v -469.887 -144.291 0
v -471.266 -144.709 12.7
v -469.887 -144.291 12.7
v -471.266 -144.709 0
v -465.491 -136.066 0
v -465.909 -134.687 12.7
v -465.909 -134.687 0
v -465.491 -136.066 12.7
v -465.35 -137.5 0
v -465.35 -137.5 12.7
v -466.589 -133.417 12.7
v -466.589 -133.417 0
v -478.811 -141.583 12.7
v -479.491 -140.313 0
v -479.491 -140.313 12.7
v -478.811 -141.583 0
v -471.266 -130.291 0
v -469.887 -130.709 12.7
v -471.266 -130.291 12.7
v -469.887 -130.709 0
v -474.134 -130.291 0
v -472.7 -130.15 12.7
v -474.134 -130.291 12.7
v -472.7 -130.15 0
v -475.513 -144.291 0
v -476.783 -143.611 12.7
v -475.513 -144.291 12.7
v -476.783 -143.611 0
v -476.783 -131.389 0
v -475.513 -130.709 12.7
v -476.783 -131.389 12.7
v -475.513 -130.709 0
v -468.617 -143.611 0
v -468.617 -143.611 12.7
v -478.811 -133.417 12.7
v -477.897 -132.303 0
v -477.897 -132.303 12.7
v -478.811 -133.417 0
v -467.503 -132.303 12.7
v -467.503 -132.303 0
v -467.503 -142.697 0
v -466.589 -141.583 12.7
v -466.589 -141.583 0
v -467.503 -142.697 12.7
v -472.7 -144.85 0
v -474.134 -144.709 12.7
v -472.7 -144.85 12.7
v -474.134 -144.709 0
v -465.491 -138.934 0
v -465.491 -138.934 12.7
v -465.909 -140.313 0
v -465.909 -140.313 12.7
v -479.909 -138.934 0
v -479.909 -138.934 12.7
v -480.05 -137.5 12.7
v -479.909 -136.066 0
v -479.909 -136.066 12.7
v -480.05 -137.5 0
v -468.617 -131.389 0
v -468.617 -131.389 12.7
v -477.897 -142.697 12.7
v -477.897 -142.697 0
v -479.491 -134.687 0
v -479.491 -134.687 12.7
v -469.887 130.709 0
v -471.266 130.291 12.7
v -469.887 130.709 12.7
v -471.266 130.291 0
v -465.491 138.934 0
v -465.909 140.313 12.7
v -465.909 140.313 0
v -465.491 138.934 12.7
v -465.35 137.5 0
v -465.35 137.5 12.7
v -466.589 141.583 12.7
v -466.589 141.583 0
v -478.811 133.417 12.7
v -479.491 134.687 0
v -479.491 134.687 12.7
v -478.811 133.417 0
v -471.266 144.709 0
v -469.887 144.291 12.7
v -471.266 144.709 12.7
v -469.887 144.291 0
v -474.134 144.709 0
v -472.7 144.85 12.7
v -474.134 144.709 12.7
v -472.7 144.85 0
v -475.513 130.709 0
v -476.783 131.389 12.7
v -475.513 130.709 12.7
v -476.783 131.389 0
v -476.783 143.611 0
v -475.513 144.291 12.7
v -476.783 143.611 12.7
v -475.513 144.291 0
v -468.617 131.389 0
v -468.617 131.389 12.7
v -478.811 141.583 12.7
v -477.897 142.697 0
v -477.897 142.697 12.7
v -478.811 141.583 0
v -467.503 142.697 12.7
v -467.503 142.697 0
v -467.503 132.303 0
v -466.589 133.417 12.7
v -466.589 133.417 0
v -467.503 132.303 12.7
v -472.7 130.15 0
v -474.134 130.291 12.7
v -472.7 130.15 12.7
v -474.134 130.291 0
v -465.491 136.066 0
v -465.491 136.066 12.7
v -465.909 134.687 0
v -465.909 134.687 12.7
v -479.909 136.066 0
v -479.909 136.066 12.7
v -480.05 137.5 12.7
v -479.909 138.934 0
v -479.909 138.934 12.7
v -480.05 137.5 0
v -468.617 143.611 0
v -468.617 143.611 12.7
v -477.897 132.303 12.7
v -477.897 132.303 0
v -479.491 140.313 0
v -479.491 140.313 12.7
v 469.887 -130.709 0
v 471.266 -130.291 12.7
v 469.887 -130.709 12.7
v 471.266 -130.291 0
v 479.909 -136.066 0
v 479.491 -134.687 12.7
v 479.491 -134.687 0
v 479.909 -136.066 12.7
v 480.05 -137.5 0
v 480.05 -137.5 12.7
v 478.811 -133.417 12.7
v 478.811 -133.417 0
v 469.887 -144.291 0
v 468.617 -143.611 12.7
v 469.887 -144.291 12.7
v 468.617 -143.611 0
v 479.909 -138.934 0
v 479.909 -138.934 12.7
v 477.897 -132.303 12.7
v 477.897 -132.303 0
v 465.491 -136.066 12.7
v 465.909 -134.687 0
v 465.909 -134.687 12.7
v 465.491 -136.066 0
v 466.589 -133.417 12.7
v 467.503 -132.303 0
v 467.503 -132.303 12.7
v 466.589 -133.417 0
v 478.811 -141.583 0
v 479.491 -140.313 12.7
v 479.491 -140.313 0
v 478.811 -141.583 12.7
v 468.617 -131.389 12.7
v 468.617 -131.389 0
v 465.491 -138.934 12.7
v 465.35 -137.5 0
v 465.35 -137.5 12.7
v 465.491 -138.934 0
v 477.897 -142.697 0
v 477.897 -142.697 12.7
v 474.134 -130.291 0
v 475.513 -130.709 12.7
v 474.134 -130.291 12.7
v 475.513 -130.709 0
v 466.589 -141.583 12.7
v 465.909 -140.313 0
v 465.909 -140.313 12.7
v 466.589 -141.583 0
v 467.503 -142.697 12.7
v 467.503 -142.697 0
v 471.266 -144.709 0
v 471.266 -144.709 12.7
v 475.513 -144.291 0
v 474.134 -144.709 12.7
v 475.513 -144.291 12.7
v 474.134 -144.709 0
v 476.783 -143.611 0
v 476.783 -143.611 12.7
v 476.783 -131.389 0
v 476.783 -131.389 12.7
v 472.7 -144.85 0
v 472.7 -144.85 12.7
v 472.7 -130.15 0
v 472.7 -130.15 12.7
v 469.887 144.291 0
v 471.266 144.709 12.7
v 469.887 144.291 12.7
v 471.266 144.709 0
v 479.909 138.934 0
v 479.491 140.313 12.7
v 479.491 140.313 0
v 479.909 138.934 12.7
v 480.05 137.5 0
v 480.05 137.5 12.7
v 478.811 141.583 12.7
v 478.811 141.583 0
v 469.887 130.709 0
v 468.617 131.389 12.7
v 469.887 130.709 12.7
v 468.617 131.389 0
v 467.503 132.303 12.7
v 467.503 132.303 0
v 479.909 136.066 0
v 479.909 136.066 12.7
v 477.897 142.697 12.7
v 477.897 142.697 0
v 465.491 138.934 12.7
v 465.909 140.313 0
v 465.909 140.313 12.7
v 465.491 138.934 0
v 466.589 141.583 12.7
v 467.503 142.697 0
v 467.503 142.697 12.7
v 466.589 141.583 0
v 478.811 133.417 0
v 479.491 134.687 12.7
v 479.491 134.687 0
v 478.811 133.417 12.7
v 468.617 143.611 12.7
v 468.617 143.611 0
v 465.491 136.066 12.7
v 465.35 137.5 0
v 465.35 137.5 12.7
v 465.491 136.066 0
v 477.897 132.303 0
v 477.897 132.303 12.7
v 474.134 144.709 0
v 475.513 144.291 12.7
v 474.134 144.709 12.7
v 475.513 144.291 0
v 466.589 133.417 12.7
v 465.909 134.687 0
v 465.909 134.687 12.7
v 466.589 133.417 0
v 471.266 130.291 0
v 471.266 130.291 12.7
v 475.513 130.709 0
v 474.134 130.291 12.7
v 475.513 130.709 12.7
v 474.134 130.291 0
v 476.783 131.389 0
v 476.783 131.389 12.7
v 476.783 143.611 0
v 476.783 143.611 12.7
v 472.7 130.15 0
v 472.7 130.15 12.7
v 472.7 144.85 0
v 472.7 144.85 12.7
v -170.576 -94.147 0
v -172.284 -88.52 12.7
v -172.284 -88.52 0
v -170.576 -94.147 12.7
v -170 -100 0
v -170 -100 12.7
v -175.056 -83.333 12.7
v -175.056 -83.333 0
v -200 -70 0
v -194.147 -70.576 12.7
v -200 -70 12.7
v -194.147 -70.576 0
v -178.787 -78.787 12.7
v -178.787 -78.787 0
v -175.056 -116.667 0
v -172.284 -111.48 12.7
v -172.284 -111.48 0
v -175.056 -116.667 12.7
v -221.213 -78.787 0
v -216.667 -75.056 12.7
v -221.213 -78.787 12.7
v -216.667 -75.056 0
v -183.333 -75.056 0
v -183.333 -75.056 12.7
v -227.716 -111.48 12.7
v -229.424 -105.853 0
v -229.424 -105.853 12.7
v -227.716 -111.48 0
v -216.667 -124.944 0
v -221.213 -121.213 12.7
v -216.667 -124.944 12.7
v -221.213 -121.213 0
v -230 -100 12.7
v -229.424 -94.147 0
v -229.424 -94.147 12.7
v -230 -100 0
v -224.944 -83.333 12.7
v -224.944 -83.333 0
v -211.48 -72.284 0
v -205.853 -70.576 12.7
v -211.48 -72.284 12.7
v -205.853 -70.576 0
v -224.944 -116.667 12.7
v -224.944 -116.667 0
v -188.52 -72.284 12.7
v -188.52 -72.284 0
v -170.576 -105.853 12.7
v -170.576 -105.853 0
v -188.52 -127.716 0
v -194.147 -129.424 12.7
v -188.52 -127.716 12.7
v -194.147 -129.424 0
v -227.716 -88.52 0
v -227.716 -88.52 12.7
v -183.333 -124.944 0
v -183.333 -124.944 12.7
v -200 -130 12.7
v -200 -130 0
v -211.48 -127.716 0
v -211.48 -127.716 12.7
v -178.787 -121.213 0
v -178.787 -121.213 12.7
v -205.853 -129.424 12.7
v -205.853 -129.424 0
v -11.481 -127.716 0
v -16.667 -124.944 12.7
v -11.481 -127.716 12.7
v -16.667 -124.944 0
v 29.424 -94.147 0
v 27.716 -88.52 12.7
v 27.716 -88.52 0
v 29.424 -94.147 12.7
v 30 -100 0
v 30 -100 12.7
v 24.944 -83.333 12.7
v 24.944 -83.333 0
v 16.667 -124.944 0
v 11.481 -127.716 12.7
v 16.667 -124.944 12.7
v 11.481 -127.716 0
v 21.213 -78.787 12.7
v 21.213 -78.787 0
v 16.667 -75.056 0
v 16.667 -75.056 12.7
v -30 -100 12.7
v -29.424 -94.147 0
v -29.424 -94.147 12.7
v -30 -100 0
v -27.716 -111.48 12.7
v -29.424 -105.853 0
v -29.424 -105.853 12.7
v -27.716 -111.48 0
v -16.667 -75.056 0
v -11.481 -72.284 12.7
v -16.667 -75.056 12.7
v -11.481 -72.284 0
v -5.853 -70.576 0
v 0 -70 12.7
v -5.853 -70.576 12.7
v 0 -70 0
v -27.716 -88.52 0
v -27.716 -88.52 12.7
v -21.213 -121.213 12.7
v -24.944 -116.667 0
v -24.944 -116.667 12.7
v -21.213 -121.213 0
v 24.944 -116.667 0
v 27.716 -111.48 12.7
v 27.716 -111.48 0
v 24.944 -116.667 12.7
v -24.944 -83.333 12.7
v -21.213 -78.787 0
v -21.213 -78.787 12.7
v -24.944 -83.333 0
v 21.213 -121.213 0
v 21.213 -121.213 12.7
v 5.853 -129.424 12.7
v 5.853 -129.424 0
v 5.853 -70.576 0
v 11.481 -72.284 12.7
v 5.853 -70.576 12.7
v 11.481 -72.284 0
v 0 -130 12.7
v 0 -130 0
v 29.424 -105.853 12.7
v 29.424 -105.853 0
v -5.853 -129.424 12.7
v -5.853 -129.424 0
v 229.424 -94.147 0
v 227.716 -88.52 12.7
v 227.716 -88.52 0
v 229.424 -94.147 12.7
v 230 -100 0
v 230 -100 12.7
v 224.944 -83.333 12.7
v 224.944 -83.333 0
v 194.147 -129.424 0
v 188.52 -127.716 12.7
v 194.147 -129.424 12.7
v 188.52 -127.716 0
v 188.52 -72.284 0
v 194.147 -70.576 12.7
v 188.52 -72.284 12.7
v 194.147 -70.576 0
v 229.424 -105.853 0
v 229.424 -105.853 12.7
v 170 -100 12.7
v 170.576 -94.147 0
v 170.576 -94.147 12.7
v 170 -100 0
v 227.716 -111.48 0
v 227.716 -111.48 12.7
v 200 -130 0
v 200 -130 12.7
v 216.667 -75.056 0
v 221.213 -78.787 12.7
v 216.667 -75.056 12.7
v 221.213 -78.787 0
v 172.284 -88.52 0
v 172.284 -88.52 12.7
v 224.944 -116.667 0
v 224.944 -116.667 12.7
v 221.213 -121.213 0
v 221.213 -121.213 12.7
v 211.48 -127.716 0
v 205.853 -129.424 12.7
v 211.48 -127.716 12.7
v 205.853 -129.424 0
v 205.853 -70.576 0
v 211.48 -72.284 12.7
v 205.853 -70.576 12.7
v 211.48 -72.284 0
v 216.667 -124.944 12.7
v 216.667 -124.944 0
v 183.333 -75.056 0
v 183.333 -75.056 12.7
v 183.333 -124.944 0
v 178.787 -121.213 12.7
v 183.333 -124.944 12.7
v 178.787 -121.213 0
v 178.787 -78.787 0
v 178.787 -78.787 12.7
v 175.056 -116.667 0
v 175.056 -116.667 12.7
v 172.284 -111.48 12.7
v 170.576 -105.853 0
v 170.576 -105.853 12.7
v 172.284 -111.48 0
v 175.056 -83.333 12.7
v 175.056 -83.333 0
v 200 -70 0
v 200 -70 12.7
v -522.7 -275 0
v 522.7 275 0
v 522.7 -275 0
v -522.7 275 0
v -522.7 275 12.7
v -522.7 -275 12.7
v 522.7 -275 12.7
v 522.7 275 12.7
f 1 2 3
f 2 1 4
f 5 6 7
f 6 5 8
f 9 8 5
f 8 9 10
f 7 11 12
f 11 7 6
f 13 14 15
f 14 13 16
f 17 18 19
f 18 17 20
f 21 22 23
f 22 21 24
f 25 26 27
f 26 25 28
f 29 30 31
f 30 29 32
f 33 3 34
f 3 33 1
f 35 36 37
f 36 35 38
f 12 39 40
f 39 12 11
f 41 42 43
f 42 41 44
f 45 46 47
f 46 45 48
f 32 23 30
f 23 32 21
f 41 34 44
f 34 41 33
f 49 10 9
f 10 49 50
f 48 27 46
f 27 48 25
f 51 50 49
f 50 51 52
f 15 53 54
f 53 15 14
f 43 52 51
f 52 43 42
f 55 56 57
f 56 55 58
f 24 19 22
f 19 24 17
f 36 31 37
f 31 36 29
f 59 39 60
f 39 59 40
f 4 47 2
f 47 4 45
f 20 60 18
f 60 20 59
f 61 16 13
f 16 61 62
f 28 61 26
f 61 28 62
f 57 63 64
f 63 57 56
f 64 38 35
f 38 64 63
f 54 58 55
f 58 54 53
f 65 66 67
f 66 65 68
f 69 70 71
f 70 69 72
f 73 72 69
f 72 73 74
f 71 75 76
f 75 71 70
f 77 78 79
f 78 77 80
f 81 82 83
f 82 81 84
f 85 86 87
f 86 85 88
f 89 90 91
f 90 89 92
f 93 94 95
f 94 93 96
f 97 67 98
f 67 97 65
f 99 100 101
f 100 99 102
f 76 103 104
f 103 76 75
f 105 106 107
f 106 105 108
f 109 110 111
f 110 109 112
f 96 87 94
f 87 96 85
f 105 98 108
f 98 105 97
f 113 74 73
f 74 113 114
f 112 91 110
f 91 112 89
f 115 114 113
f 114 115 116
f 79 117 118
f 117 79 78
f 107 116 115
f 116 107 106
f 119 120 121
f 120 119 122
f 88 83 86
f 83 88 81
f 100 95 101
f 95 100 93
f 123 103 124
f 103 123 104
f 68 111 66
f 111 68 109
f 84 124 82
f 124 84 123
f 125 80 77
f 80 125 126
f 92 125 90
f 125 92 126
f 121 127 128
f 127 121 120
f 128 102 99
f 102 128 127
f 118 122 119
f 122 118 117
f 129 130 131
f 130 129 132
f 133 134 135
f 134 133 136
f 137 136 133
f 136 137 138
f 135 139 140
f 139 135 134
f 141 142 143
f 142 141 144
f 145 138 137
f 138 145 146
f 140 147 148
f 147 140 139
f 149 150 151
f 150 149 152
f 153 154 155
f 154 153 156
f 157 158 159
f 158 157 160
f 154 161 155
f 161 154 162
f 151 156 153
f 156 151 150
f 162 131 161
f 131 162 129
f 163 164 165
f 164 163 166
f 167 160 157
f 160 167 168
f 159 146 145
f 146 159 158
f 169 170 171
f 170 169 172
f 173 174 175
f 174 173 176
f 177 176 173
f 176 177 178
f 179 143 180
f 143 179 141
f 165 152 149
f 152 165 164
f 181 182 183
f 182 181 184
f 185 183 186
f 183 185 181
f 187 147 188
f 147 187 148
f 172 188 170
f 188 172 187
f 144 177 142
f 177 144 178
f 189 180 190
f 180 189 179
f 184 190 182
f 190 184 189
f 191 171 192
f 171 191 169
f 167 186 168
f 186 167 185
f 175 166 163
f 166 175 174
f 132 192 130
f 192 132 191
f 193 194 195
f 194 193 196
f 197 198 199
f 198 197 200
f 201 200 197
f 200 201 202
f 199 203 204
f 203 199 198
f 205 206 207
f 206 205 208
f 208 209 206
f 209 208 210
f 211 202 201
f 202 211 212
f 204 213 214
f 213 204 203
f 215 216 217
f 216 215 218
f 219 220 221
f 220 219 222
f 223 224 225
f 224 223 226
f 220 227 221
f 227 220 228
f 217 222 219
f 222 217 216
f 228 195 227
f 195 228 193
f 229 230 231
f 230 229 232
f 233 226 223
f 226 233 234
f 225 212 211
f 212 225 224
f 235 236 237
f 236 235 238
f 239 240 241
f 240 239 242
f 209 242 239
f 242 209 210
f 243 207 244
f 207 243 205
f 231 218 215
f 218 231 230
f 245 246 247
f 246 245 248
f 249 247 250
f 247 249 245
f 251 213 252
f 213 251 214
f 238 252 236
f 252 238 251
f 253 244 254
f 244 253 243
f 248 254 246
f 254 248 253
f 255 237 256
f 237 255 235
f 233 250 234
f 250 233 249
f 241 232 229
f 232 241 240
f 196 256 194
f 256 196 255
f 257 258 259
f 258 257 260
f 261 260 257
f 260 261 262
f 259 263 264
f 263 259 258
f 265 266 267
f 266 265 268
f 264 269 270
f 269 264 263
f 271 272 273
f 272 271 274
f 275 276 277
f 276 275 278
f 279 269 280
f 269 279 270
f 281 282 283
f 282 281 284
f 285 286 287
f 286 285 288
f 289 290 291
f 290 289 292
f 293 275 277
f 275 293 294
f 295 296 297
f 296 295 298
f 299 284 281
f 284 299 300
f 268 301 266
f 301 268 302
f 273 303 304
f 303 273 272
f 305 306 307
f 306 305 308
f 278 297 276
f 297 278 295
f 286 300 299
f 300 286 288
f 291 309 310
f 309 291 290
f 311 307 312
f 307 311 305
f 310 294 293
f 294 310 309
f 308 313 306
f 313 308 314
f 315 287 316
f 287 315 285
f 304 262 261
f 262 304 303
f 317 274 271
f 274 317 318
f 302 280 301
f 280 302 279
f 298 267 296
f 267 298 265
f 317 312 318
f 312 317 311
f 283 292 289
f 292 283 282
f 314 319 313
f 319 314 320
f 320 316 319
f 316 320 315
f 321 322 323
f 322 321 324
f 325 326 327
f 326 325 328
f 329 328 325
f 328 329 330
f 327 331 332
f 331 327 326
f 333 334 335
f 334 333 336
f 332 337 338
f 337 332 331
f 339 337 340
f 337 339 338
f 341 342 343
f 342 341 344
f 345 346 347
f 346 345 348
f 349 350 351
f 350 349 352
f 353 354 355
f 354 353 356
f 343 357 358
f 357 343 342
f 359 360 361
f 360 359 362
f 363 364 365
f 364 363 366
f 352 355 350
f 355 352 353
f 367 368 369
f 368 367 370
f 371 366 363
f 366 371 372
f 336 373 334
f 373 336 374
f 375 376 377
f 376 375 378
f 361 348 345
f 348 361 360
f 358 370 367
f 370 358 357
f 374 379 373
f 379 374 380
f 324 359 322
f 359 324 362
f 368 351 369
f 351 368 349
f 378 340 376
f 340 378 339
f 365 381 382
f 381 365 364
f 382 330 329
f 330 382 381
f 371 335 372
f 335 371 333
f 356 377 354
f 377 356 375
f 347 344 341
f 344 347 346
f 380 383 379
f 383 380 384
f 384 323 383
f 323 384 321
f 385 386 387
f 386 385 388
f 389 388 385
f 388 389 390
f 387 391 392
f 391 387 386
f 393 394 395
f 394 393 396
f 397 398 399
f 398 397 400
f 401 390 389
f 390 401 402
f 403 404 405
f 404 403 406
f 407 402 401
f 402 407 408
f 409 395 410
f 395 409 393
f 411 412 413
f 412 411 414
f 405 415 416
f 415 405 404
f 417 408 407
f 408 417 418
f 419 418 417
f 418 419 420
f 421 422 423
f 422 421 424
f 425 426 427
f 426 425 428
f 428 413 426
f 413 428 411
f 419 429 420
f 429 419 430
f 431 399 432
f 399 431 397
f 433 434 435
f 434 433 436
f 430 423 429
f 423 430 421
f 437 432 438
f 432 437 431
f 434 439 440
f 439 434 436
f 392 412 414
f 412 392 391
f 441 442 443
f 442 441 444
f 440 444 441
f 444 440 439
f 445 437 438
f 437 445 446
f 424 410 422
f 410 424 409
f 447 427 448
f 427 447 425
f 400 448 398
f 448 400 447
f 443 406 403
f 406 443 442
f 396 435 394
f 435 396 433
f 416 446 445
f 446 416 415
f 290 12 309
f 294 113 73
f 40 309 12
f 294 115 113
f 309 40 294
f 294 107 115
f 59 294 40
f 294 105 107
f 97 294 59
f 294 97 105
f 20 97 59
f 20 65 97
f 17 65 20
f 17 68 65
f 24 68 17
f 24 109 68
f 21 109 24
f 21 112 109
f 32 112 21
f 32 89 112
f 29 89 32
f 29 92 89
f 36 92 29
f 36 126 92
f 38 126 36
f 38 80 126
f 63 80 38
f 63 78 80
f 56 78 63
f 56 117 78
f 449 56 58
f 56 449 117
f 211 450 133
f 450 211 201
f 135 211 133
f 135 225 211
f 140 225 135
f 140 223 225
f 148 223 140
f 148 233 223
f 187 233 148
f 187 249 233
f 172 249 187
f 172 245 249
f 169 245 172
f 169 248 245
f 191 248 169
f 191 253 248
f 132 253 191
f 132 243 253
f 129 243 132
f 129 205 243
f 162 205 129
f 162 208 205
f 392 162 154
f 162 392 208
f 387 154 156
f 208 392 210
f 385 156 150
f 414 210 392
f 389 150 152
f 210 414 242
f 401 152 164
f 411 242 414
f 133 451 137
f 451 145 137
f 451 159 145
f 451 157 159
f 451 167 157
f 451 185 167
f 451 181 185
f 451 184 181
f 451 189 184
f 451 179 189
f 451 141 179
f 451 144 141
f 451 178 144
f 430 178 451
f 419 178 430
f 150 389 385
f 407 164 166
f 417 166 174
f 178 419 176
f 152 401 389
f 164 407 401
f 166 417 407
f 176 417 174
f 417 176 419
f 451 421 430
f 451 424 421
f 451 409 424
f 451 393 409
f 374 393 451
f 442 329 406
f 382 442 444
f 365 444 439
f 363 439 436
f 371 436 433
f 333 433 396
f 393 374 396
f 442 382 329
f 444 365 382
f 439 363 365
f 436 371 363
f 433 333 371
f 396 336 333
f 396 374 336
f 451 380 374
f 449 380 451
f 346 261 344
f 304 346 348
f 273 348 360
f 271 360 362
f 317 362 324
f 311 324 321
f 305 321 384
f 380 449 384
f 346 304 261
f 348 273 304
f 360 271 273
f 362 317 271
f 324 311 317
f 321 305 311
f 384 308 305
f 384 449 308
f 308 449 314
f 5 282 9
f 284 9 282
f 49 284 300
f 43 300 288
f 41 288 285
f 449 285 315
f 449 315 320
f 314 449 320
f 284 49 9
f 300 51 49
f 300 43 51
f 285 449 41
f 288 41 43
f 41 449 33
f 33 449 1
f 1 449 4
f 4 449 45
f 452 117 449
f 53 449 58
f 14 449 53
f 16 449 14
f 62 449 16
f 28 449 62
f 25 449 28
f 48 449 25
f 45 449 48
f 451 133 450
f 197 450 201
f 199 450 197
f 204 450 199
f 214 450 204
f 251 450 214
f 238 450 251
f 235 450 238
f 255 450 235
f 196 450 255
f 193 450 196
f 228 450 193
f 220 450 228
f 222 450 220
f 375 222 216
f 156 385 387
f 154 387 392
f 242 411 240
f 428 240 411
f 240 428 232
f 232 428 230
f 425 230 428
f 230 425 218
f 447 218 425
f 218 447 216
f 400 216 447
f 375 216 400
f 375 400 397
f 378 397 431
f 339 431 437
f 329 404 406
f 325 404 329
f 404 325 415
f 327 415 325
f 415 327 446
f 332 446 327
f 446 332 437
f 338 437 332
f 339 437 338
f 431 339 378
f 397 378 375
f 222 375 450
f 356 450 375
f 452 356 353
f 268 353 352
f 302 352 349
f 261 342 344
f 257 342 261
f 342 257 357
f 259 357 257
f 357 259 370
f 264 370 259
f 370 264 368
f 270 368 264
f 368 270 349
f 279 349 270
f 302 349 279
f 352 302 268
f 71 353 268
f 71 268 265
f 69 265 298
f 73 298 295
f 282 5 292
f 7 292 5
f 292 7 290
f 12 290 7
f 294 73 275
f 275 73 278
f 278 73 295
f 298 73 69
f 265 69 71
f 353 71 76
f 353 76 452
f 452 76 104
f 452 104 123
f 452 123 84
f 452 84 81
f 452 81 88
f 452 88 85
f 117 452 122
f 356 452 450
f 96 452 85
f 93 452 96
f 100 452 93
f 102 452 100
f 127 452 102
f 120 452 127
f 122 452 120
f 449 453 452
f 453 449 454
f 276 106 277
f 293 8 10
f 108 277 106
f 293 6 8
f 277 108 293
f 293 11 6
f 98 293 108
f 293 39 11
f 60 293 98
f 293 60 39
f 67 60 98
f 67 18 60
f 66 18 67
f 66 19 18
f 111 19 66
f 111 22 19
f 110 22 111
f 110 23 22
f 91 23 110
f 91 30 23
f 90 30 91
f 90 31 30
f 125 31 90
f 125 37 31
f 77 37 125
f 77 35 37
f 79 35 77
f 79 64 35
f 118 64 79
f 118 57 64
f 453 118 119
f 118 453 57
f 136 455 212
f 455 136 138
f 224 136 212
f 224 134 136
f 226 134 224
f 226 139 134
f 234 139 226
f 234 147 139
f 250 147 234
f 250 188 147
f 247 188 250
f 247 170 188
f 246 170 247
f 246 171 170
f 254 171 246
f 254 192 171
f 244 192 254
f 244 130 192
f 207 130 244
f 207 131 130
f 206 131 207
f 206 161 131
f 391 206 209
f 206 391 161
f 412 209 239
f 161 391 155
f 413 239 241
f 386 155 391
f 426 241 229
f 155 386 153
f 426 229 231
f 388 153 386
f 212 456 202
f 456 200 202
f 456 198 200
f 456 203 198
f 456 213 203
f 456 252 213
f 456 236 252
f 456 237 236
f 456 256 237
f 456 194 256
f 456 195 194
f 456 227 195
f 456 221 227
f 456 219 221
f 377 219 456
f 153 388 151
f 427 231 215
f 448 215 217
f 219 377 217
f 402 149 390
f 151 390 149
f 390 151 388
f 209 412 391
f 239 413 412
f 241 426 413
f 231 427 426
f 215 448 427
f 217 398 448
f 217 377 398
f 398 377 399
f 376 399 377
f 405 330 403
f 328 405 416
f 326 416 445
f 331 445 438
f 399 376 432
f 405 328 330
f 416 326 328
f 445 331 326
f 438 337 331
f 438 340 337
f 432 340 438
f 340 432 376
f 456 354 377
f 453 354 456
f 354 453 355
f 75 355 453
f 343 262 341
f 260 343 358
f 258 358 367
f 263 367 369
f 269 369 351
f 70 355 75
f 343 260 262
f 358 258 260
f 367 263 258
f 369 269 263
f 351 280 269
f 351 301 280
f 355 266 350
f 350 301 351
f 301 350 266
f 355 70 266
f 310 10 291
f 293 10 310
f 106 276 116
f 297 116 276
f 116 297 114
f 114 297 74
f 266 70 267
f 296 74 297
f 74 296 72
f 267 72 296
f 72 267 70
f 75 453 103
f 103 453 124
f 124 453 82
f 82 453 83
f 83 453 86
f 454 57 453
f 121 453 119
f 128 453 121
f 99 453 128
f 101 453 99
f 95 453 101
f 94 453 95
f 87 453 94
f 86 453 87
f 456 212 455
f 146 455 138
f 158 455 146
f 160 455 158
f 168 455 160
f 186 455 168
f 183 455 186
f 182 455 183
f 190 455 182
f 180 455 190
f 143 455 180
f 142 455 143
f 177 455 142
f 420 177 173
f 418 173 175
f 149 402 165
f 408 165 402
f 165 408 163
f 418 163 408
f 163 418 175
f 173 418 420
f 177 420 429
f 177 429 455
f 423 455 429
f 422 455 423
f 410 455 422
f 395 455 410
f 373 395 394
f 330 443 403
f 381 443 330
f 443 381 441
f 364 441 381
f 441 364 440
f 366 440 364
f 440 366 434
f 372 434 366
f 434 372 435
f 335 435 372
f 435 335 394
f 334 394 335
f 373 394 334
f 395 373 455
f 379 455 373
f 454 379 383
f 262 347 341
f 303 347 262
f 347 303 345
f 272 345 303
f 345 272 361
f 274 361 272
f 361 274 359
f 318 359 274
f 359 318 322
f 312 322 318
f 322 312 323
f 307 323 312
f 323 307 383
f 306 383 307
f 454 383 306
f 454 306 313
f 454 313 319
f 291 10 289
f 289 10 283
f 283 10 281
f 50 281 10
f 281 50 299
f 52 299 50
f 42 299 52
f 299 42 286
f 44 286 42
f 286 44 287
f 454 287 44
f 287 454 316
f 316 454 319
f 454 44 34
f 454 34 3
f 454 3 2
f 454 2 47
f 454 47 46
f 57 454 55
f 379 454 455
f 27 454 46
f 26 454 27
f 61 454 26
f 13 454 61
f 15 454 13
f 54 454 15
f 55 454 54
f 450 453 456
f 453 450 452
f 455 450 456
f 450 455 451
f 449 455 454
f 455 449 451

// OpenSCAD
// file: ../openscad/lifetrac_v25_params.scad
// lifetrac_v25_params.scad
// Essential parameters for LifeTrac v25 individual parts
// This file contains only the constants needed for part design
// Full assembly uses lifetrac_v25.scad

// -----------------------------------------------------------------------------
// Compatibility helper
// OpenSCAD throws warnings when the BOSL2 helper `parent_modules()` is missing.
// We provide a stub that returns an empty list so part files can run cleanly
// when opened directly without pulling in BOSL2.
function parent_modules() = is_undef($parent_modules) ? [] : $parent_modules;

// =============================================================================
// MATERIAL CONSTANTS
// =============================================================================

PLATE_1_4_INCH = 6.35;   // 1/4" = 6.35mm
PLATE_1_2_INCH = 12.7;   // 1/2" = 12.7mm
PLATE_3_4_INCH = 19.05;  // 3/4" = 19.05mm
TUBE_3X3_1_4 = [76.2, 6.35];    // 3"x3" x 1/4" wall
TUBE_4X4_1_4 = [101.6, 6.35];   // 4"x4" x 1/4" wall (OSE standard)
TUBE_2X2_1_4 = [50.8, 6.35];    // 2"x2" x 1/4" wall
TUBE_2X4_1_4 = [50.8, 101.6, 6.35]; // 2"x4" rectangular

// Bolt/pin diameters
PIVOT_PIN_DIA = 38.1;    // 1.5" pivot pin
BOLT_DIA_1_2 = 12.7;     // 1/2" bolt
BOLT_DIA_3_4 = 19.05;    // 3/4" bolt
BOLT_DIA_1 = 25.4;       // 1" bolt

// =============================================================================
// MACHINE DIMENSIONS
// =============================================================================

// Target size: between Toro Dingo (915mm wide) and Bobcat (1830mm wide)
MACHINE_WIDTH = 1200;    // Overall width
MACHINE_LENGTH = 1800;   // Overall length
MACHINE_HEIGHT = 1000;   // Height to top of frame
WHEEL_BASE = 1400;       // Distance between front and rear axles
TRACK_WIDTH = 900;       // Distance between centerlines of left/right side panels

// Side panel sandwich configuration
SANDWICH_SPACING = 120;  // Gap between inner and outer panels (for arm pivot)
PANEL_THICKNESS = PLATE_1_2_INCH;

// Wheel dimensions
WHEEL_DIAMETER = 500;    // 500mm diameter wheels
WHEEL_WIDTH = 200;       // 200mm wide wheels
WHEEL_CLEARANCE = 50;    // Clearance between wheel and outer panel

// Ground clearance - bottom of frame above ground
GROUND_CLEARANCE = 150;  // 150mm ground clearance under frame
WHEEL_RADIUS = WHEEL_DIAMETER / 2;

// Frame sits with bottom at GROUND_CLEARANCE height
FRAME_Z_OFFSET = GROUND_CLEARANCE;

// Calculate wheel X offset - wheels positioned outside the outer panels
WHEEL_X_OFFSET = TRACK_WIDTH/2 + SANDWICH_SPACING/2 + PANEL_THICKNESS + WHEEL_WIDTH/2 + WHEEL_CLEARANCE;

// =============================================================================
// LOADER ARM DIMENSIONS
// =============================================================================

// Design constraints
BUCKET_GROUND_CLEARANCE = 0;      // Bucket bottom at ground level when lowered
BUCKET_FRONT_CLEARANCE = 100;     // 100mm (~4") clearance between bucket back and front of machine

// Arm pivot point (at top rear of side panels - tall end)
ARM_PIVOT_Y = 200;  // Near rear of machine, between sandwich plates  
ARM_PIVOT_Z_HEIGHT = MACHINE_HEIGHT - 50;  // Height above frame bottom
ARM_PIVOT_Z = FRAME_Z_OFFSET + ARM_PIVOT_Z_HEIGHT;  // Absolute Z position

// Calculate required arm length
MIN_HORIZONTAL_REACH = WHEEL_BASE + BUCKET_FRONT_CLEARANCE - ARM_PIVOT_Y;
ARM_LENGTH = ceil(sqrt(pow(ARM_PIVOT_Z, 2) + pow(MIN_HORIZONTAL_REACH, 2)));
ARM_GROUND_ANGLE = asin(ARM_PIVOT_Z / ARM_LENGTH);  // Angle below horizontal (degrees)

ARM_TUBE_SIZE = TUBE_3X3_1_4;         // 3"x3" arm tubing
ARM_SPACING = TRACK_WIDTH;            // Distance between arm centerlines

// Arm angle limits
ARM_MIN_ANGLE = -ARM_GROUND_ANGLE;     // Lowest position (at ground)
ARM_MAX_ANGLE = 60;                     // Maximum raised position

// Cross beam configuration
CROSS_BEAM_SIZE = TUBE_2X2_1_4[0];    // 2"x2" tube size
CROSS_BEAM_CLEARANCE = 15;             // Extra clearance around cross beam in cutout
CROSS_BEAM_1_POS = ARM_LENGTH * 0.65;   // First cross beam position
CROSS_BEAM_2_POS = ARM_LENGTH * 0.95;   // Second cross beam position (near bucket)

// Pivot position in panel coordinates (for arc slot calculations)
PIVOT_PANEL_X = ARM_PIVOT_Y;                          // Pivot X in panel coords
PIVOT_PANEL_Y = ARM_PIVOT_Z - FRAME_Z_OFFSET;         // Pivot Y in panel coords

// =============================================================================
// HYDRAULIC CYLINDER MOUNTING POINTS
// =============================================================================

// Lift cylinder mounting points (arms pivot at rear, cylinders attach forward)
LIFT_CYL_BASE_Y = WHEEL_BASE * 0.5;          // Base mount Y position (forward of pivot)
LIFT_CYL_BASE_Z = FRAME_Z_OFFSET + MACHINE_HEIGHT * 0.4;      // Base mount Z position
LIFT_CYL_ARM_OFFSET = ARM_LENGTH * 0.25;     // Attachment point along arm from pivot (proportional)

// =============================================================================
// BUCKET DIMENSIONS
// =============================================================================

BOBCAT_QA_WIDTH = 1168;           // 46" standard width
BOBCAT_QA_HEIGHT = 457;           // 18" plate height
BOBCAT_QA_PIN_DIA = 25.4;         // 1" locking pin

BUCKET_WIDTH = 1100;              // Slightly narrower than QA plate
BUCKET_DEPTH = 600;
BUCKET_HEIGHT = 450;

// =============================================================================
// STANDING DECK DIMENSIONS
// =============================================================================

DECK_WIDTH = 700;
DECK_DEPTH = 400;
DECK_HEIGHT = 250;  // Height above ground
// main file
// rear_crossmember.scad
// Rear crossmember plate for LifeTrac v25
// Connects left and right side panels at the rear

include <../openscad/lifetrac_v25_params.scad>

module rear_crossmember() {
    back_height = MACHINE_HEIGHT * 0.55;
    crossmember_width = TRACK_WIDTH + SANDWICH_SPACING + PANEL_THICKNESS * 2;
    plate_thickness = PANEL_THICKNESS;

    // Lay the plate flat in XY so projection captures all features
    difference() {
        // Main plate
        linear_extrude(height=plate_thickness)
        square([crossmember_width, back_height], center=true);

        // Bolt holes for mounting to side panels (4 per side)
        for (side = [-1, 1]) {
            x_pos = side * (crossmember_width/2 - 50);
            for (z_pos = [back_height/4, back_height * 3/4]) {
                y_pos = z_pos - back_height/2; // shift because square is centered
                translate([x_pos, y_pos, plate_thickness/2])
                cylinder(d=BOLT_DIA_1_2 + 2, h=plate_thickness+4, center=true, $fn=32);
            }
        }

        // Lightening holes to reduce weight
        for (x = [-200, 0, 200]) {
            y_pos = (back_height/2 - 100) - back_height/2; // place 100mm below top edge
            translate([x, y_pos, plate_thickness/2])
            cylinder(d=60, h=plate_thickness+4, center=true, $fn=32);
        }
    }
}

// Render the part for preview/export
if ($preview || len(search("rear_crossmember.scad", parent_modules())) == 0) {
    rear_crossmember();
}
